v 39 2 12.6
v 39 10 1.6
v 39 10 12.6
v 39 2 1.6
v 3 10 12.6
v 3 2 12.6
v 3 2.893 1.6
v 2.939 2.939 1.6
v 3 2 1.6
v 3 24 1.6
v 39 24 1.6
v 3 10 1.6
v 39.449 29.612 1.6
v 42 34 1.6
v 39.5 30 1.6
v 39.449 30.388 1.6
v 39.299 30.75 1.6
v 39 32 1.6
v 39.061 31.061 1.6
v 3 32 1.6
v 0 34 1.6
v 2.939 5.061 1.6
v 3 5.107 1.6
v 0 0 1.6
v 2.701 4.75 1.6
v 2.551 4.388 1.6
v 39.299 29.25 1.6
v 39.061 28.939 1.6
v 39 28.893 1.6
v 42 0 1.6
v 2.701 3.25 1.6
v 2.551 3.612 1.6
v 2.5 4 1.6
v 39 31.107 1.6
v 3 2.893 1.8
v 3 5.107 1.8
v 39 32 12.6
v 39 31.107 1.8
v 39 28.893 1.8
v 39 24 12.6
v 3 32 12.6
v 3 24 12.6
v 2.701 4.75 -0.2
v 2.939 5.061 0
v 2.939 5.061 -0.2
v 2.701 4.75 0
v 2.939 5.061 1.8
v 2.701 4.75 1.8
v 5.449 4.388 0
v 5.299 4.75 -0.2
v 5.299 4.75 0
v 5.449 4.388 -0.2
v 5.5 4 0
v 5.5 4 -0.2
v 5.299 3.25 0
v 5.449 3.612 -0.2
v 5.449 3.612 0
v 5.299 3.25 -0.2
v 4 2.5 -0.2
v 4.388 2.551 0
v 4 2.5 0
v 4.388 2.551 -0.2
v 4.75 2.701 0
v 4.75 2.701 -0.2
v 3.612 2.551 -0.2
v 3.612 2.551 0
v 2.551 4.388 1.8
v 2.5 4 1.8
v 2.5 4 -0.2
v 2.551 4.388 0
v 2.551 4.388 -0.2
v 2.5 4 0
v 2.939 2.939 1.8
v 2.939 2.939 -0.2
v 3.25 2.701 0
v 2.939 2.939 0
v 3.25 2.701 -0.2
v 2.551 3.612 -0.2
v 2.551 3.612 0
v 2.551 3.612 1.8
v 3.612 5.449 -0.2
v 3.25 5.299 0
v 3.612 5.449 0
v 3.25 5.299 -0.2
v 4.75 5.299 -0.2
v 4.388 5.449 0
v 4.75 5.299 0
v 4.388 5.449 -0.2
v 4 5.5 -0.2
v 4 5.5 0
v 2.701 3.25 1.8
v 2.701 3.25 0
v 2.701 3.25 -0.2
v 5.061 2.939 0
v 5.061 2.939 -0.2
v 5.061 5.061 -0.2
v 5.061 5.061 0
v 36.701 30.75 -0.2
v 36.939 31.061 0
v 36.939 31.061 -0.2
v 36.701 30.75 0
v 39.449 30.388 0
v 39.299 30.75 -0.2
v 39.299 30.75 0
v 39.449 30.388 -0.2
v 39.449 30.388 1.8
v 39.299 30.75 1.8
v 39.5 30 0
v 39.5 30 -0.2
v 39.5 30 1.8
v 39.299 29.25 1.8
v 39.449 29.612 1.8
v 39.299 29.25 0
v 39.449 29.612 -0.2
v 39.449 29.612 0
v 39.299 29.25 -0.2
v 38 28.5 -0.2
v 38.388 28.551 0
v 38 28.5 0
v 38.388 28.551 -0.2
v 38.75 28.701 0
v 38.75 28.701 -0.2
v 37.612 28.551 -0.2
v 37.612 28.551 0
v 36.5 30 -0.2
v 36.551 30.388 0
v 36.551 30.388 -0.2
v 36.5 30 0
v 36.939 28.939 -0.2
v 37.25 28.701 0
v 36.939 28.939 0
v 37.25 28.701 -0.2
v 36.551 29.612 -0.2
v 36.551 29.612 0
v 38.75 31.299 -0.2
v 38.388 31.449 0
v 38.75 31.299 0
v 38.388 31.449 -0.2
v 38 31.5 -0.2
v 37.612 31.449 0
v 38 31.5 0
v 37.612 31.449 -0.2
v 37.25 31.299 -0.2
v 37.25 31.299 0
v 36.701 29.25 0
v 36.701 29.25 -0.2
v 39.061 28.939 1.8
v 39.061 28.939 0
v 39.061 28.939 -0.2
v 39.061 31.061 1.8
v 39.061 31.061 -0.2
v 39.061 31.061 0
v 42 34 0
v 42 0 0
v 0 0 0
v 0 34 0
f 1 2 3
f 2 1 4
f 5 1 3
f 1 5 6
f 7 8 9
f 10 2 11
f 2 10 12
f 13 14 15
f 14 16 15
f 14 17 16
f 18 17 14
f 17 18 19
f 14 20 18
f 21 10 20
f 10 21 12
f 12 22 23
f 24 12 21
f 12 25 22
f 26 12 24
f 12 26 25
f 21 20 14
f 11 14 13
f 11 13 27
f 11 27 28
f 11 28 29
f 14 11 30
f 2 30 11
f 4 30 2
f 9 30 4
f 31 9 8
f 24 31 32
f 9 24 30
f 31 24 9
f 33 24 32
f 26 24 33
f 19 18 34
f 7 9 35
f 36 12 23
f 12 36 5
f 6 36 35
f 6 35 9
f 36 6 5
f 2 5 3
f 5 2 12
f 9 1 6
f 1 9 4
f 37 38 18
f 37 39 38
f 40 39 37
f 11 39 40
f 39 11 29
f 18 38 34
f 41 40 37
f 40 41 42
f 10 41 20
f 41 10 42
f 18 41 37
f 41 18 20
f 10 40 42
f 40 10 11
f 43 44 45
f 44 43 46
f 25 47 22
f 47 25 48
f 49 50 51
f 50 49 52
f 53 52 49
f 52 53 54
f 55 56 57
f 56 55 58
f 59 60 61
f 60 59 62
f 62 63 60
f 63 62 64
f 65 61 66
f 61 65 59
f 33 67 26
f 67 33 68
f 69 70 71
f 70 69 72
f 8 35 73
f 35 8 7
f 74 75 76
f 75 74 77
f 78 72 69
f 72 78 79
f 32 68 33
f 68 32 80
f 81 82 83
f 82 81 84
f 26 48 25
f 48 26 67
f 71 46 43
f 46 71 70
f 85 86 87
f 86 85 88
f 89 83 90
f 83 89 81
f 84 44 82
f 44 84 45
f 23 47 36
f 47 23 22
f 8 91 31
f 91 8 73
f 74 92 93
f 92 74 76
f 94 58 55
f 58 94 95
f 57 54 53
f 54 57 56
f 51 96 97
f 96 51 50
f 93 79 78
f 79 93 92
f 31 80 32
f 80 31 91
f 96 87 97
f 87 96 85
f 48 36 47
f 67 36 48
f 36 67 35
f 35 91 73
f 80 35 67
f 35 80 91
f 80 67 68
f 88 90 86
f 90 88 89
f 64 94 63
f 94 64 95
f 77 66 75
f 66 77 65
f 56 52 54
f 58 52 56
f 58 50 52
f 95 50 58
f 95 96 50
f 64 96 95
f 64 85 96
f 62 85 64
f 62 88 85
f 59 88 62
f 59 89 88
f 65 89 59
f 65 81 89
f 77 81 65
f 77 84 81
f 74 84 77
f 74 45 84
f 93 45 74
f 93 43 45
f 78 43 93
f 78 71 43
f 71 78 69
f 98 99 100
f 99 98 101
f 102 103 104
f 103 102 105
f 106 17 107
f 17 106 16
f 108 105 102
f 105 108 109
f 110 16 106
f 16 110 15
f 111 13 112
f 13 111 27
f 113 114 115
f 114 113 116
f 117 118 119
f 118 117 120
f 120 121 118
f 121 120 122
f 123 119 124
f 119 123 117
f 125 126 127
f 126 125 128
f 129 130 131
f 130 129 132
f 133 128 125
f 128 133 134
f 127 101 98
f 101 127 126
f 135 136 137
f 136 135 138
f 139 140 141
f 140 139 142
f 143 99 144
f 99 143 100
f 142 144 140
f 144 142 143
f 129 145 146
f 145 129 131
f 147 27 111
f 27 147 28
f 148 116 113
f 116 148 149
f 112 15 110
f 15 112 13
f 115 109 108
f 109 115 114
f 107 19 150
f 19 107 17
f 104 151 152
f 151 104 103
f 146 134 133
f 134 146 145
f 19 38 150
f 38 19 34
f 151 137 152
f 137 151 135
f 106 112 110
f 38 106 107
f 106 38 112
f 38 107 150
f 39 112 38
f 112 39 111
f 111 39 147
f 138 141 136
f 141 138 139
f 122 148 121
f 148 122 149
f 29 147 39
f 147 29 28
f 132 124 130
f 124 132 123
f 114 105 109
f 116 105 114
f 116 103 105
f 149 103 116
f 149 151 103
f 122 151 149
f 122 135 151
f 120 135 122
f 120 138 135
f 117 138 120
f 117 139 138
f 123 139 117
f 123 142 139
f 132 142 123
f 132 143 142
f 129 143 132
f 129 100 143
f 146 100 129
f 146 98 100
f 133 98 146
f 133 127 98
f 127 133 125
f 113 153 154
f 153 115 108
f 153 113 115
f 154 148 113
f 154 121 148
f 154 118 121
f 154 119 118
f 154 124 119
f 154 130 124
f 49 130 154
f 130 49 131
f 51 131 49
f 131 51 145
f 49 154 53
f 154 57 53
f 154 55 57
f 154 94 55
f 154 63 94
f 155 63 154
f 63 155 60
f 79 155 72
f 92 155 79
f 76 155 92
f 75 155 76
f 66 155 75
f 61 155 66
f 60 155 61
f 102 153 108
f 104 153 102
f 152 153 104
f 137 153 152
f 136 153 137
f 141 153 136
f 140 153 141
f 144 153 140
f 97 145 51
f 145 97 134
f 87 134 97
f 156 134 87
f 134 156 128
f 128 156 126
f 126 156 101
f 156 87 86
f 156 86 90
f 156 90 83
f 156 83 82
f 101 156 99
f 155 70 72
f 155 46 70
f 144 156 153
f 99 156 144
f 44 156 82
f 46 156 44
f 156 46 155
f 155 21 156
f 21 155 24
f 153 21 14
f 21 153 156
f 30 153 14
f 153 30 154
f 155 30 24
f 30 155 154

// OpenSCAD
/* =============================================================================
 * 智慧香爐 — 外購元件：D4184 MOSFET 模組
 * =============================================================================
 * ★★ 這不是列印件，是外購品的示意模型 ★★
 * 尺寸來自 ../params.scad，為常見規格（估）。
 * 用途：組裝干涉檢查、螺絲可及性、目視確認裝得下。
 * ★不可當成實際尺寸寫進報告★（CLAUDE.md §7）
 *
 * 原點：PCB 左下角、z=0 為板底
 * ============================================================================= */

include <../params.scad>


module d4184() {
    color("#1c6b3c") linear_extrude(PCB_T) square([D4184_W, D4184_D]);
    // 兩組綠色端子台（12V 進、風扇出）
    color("#2e7d32") {
        translate([3, 2, PCB_T])               cube([D4184_W - 6, 8, D4184_TERM_H]);
        translate([3, D4184_D - 10, PCB_T])    cube([D4184_W - 6, 8, D4184_TERM_H]);
    }
    color("#8a8f94") {
        translate([4, 4, -0.2])
            cylinder(h = PCB_T + 0.4, d = 3.0, $fn = 24);
        translate([D4184_W - 4, D4184_D - 4, -0.2])
            cylinder(h = PCB_T + 0.4, d = 3.0, $fn = 24);
    }
}

// ── 單獨開檔時的預覽（被 use<> 引入時不執行）──
d4184();
